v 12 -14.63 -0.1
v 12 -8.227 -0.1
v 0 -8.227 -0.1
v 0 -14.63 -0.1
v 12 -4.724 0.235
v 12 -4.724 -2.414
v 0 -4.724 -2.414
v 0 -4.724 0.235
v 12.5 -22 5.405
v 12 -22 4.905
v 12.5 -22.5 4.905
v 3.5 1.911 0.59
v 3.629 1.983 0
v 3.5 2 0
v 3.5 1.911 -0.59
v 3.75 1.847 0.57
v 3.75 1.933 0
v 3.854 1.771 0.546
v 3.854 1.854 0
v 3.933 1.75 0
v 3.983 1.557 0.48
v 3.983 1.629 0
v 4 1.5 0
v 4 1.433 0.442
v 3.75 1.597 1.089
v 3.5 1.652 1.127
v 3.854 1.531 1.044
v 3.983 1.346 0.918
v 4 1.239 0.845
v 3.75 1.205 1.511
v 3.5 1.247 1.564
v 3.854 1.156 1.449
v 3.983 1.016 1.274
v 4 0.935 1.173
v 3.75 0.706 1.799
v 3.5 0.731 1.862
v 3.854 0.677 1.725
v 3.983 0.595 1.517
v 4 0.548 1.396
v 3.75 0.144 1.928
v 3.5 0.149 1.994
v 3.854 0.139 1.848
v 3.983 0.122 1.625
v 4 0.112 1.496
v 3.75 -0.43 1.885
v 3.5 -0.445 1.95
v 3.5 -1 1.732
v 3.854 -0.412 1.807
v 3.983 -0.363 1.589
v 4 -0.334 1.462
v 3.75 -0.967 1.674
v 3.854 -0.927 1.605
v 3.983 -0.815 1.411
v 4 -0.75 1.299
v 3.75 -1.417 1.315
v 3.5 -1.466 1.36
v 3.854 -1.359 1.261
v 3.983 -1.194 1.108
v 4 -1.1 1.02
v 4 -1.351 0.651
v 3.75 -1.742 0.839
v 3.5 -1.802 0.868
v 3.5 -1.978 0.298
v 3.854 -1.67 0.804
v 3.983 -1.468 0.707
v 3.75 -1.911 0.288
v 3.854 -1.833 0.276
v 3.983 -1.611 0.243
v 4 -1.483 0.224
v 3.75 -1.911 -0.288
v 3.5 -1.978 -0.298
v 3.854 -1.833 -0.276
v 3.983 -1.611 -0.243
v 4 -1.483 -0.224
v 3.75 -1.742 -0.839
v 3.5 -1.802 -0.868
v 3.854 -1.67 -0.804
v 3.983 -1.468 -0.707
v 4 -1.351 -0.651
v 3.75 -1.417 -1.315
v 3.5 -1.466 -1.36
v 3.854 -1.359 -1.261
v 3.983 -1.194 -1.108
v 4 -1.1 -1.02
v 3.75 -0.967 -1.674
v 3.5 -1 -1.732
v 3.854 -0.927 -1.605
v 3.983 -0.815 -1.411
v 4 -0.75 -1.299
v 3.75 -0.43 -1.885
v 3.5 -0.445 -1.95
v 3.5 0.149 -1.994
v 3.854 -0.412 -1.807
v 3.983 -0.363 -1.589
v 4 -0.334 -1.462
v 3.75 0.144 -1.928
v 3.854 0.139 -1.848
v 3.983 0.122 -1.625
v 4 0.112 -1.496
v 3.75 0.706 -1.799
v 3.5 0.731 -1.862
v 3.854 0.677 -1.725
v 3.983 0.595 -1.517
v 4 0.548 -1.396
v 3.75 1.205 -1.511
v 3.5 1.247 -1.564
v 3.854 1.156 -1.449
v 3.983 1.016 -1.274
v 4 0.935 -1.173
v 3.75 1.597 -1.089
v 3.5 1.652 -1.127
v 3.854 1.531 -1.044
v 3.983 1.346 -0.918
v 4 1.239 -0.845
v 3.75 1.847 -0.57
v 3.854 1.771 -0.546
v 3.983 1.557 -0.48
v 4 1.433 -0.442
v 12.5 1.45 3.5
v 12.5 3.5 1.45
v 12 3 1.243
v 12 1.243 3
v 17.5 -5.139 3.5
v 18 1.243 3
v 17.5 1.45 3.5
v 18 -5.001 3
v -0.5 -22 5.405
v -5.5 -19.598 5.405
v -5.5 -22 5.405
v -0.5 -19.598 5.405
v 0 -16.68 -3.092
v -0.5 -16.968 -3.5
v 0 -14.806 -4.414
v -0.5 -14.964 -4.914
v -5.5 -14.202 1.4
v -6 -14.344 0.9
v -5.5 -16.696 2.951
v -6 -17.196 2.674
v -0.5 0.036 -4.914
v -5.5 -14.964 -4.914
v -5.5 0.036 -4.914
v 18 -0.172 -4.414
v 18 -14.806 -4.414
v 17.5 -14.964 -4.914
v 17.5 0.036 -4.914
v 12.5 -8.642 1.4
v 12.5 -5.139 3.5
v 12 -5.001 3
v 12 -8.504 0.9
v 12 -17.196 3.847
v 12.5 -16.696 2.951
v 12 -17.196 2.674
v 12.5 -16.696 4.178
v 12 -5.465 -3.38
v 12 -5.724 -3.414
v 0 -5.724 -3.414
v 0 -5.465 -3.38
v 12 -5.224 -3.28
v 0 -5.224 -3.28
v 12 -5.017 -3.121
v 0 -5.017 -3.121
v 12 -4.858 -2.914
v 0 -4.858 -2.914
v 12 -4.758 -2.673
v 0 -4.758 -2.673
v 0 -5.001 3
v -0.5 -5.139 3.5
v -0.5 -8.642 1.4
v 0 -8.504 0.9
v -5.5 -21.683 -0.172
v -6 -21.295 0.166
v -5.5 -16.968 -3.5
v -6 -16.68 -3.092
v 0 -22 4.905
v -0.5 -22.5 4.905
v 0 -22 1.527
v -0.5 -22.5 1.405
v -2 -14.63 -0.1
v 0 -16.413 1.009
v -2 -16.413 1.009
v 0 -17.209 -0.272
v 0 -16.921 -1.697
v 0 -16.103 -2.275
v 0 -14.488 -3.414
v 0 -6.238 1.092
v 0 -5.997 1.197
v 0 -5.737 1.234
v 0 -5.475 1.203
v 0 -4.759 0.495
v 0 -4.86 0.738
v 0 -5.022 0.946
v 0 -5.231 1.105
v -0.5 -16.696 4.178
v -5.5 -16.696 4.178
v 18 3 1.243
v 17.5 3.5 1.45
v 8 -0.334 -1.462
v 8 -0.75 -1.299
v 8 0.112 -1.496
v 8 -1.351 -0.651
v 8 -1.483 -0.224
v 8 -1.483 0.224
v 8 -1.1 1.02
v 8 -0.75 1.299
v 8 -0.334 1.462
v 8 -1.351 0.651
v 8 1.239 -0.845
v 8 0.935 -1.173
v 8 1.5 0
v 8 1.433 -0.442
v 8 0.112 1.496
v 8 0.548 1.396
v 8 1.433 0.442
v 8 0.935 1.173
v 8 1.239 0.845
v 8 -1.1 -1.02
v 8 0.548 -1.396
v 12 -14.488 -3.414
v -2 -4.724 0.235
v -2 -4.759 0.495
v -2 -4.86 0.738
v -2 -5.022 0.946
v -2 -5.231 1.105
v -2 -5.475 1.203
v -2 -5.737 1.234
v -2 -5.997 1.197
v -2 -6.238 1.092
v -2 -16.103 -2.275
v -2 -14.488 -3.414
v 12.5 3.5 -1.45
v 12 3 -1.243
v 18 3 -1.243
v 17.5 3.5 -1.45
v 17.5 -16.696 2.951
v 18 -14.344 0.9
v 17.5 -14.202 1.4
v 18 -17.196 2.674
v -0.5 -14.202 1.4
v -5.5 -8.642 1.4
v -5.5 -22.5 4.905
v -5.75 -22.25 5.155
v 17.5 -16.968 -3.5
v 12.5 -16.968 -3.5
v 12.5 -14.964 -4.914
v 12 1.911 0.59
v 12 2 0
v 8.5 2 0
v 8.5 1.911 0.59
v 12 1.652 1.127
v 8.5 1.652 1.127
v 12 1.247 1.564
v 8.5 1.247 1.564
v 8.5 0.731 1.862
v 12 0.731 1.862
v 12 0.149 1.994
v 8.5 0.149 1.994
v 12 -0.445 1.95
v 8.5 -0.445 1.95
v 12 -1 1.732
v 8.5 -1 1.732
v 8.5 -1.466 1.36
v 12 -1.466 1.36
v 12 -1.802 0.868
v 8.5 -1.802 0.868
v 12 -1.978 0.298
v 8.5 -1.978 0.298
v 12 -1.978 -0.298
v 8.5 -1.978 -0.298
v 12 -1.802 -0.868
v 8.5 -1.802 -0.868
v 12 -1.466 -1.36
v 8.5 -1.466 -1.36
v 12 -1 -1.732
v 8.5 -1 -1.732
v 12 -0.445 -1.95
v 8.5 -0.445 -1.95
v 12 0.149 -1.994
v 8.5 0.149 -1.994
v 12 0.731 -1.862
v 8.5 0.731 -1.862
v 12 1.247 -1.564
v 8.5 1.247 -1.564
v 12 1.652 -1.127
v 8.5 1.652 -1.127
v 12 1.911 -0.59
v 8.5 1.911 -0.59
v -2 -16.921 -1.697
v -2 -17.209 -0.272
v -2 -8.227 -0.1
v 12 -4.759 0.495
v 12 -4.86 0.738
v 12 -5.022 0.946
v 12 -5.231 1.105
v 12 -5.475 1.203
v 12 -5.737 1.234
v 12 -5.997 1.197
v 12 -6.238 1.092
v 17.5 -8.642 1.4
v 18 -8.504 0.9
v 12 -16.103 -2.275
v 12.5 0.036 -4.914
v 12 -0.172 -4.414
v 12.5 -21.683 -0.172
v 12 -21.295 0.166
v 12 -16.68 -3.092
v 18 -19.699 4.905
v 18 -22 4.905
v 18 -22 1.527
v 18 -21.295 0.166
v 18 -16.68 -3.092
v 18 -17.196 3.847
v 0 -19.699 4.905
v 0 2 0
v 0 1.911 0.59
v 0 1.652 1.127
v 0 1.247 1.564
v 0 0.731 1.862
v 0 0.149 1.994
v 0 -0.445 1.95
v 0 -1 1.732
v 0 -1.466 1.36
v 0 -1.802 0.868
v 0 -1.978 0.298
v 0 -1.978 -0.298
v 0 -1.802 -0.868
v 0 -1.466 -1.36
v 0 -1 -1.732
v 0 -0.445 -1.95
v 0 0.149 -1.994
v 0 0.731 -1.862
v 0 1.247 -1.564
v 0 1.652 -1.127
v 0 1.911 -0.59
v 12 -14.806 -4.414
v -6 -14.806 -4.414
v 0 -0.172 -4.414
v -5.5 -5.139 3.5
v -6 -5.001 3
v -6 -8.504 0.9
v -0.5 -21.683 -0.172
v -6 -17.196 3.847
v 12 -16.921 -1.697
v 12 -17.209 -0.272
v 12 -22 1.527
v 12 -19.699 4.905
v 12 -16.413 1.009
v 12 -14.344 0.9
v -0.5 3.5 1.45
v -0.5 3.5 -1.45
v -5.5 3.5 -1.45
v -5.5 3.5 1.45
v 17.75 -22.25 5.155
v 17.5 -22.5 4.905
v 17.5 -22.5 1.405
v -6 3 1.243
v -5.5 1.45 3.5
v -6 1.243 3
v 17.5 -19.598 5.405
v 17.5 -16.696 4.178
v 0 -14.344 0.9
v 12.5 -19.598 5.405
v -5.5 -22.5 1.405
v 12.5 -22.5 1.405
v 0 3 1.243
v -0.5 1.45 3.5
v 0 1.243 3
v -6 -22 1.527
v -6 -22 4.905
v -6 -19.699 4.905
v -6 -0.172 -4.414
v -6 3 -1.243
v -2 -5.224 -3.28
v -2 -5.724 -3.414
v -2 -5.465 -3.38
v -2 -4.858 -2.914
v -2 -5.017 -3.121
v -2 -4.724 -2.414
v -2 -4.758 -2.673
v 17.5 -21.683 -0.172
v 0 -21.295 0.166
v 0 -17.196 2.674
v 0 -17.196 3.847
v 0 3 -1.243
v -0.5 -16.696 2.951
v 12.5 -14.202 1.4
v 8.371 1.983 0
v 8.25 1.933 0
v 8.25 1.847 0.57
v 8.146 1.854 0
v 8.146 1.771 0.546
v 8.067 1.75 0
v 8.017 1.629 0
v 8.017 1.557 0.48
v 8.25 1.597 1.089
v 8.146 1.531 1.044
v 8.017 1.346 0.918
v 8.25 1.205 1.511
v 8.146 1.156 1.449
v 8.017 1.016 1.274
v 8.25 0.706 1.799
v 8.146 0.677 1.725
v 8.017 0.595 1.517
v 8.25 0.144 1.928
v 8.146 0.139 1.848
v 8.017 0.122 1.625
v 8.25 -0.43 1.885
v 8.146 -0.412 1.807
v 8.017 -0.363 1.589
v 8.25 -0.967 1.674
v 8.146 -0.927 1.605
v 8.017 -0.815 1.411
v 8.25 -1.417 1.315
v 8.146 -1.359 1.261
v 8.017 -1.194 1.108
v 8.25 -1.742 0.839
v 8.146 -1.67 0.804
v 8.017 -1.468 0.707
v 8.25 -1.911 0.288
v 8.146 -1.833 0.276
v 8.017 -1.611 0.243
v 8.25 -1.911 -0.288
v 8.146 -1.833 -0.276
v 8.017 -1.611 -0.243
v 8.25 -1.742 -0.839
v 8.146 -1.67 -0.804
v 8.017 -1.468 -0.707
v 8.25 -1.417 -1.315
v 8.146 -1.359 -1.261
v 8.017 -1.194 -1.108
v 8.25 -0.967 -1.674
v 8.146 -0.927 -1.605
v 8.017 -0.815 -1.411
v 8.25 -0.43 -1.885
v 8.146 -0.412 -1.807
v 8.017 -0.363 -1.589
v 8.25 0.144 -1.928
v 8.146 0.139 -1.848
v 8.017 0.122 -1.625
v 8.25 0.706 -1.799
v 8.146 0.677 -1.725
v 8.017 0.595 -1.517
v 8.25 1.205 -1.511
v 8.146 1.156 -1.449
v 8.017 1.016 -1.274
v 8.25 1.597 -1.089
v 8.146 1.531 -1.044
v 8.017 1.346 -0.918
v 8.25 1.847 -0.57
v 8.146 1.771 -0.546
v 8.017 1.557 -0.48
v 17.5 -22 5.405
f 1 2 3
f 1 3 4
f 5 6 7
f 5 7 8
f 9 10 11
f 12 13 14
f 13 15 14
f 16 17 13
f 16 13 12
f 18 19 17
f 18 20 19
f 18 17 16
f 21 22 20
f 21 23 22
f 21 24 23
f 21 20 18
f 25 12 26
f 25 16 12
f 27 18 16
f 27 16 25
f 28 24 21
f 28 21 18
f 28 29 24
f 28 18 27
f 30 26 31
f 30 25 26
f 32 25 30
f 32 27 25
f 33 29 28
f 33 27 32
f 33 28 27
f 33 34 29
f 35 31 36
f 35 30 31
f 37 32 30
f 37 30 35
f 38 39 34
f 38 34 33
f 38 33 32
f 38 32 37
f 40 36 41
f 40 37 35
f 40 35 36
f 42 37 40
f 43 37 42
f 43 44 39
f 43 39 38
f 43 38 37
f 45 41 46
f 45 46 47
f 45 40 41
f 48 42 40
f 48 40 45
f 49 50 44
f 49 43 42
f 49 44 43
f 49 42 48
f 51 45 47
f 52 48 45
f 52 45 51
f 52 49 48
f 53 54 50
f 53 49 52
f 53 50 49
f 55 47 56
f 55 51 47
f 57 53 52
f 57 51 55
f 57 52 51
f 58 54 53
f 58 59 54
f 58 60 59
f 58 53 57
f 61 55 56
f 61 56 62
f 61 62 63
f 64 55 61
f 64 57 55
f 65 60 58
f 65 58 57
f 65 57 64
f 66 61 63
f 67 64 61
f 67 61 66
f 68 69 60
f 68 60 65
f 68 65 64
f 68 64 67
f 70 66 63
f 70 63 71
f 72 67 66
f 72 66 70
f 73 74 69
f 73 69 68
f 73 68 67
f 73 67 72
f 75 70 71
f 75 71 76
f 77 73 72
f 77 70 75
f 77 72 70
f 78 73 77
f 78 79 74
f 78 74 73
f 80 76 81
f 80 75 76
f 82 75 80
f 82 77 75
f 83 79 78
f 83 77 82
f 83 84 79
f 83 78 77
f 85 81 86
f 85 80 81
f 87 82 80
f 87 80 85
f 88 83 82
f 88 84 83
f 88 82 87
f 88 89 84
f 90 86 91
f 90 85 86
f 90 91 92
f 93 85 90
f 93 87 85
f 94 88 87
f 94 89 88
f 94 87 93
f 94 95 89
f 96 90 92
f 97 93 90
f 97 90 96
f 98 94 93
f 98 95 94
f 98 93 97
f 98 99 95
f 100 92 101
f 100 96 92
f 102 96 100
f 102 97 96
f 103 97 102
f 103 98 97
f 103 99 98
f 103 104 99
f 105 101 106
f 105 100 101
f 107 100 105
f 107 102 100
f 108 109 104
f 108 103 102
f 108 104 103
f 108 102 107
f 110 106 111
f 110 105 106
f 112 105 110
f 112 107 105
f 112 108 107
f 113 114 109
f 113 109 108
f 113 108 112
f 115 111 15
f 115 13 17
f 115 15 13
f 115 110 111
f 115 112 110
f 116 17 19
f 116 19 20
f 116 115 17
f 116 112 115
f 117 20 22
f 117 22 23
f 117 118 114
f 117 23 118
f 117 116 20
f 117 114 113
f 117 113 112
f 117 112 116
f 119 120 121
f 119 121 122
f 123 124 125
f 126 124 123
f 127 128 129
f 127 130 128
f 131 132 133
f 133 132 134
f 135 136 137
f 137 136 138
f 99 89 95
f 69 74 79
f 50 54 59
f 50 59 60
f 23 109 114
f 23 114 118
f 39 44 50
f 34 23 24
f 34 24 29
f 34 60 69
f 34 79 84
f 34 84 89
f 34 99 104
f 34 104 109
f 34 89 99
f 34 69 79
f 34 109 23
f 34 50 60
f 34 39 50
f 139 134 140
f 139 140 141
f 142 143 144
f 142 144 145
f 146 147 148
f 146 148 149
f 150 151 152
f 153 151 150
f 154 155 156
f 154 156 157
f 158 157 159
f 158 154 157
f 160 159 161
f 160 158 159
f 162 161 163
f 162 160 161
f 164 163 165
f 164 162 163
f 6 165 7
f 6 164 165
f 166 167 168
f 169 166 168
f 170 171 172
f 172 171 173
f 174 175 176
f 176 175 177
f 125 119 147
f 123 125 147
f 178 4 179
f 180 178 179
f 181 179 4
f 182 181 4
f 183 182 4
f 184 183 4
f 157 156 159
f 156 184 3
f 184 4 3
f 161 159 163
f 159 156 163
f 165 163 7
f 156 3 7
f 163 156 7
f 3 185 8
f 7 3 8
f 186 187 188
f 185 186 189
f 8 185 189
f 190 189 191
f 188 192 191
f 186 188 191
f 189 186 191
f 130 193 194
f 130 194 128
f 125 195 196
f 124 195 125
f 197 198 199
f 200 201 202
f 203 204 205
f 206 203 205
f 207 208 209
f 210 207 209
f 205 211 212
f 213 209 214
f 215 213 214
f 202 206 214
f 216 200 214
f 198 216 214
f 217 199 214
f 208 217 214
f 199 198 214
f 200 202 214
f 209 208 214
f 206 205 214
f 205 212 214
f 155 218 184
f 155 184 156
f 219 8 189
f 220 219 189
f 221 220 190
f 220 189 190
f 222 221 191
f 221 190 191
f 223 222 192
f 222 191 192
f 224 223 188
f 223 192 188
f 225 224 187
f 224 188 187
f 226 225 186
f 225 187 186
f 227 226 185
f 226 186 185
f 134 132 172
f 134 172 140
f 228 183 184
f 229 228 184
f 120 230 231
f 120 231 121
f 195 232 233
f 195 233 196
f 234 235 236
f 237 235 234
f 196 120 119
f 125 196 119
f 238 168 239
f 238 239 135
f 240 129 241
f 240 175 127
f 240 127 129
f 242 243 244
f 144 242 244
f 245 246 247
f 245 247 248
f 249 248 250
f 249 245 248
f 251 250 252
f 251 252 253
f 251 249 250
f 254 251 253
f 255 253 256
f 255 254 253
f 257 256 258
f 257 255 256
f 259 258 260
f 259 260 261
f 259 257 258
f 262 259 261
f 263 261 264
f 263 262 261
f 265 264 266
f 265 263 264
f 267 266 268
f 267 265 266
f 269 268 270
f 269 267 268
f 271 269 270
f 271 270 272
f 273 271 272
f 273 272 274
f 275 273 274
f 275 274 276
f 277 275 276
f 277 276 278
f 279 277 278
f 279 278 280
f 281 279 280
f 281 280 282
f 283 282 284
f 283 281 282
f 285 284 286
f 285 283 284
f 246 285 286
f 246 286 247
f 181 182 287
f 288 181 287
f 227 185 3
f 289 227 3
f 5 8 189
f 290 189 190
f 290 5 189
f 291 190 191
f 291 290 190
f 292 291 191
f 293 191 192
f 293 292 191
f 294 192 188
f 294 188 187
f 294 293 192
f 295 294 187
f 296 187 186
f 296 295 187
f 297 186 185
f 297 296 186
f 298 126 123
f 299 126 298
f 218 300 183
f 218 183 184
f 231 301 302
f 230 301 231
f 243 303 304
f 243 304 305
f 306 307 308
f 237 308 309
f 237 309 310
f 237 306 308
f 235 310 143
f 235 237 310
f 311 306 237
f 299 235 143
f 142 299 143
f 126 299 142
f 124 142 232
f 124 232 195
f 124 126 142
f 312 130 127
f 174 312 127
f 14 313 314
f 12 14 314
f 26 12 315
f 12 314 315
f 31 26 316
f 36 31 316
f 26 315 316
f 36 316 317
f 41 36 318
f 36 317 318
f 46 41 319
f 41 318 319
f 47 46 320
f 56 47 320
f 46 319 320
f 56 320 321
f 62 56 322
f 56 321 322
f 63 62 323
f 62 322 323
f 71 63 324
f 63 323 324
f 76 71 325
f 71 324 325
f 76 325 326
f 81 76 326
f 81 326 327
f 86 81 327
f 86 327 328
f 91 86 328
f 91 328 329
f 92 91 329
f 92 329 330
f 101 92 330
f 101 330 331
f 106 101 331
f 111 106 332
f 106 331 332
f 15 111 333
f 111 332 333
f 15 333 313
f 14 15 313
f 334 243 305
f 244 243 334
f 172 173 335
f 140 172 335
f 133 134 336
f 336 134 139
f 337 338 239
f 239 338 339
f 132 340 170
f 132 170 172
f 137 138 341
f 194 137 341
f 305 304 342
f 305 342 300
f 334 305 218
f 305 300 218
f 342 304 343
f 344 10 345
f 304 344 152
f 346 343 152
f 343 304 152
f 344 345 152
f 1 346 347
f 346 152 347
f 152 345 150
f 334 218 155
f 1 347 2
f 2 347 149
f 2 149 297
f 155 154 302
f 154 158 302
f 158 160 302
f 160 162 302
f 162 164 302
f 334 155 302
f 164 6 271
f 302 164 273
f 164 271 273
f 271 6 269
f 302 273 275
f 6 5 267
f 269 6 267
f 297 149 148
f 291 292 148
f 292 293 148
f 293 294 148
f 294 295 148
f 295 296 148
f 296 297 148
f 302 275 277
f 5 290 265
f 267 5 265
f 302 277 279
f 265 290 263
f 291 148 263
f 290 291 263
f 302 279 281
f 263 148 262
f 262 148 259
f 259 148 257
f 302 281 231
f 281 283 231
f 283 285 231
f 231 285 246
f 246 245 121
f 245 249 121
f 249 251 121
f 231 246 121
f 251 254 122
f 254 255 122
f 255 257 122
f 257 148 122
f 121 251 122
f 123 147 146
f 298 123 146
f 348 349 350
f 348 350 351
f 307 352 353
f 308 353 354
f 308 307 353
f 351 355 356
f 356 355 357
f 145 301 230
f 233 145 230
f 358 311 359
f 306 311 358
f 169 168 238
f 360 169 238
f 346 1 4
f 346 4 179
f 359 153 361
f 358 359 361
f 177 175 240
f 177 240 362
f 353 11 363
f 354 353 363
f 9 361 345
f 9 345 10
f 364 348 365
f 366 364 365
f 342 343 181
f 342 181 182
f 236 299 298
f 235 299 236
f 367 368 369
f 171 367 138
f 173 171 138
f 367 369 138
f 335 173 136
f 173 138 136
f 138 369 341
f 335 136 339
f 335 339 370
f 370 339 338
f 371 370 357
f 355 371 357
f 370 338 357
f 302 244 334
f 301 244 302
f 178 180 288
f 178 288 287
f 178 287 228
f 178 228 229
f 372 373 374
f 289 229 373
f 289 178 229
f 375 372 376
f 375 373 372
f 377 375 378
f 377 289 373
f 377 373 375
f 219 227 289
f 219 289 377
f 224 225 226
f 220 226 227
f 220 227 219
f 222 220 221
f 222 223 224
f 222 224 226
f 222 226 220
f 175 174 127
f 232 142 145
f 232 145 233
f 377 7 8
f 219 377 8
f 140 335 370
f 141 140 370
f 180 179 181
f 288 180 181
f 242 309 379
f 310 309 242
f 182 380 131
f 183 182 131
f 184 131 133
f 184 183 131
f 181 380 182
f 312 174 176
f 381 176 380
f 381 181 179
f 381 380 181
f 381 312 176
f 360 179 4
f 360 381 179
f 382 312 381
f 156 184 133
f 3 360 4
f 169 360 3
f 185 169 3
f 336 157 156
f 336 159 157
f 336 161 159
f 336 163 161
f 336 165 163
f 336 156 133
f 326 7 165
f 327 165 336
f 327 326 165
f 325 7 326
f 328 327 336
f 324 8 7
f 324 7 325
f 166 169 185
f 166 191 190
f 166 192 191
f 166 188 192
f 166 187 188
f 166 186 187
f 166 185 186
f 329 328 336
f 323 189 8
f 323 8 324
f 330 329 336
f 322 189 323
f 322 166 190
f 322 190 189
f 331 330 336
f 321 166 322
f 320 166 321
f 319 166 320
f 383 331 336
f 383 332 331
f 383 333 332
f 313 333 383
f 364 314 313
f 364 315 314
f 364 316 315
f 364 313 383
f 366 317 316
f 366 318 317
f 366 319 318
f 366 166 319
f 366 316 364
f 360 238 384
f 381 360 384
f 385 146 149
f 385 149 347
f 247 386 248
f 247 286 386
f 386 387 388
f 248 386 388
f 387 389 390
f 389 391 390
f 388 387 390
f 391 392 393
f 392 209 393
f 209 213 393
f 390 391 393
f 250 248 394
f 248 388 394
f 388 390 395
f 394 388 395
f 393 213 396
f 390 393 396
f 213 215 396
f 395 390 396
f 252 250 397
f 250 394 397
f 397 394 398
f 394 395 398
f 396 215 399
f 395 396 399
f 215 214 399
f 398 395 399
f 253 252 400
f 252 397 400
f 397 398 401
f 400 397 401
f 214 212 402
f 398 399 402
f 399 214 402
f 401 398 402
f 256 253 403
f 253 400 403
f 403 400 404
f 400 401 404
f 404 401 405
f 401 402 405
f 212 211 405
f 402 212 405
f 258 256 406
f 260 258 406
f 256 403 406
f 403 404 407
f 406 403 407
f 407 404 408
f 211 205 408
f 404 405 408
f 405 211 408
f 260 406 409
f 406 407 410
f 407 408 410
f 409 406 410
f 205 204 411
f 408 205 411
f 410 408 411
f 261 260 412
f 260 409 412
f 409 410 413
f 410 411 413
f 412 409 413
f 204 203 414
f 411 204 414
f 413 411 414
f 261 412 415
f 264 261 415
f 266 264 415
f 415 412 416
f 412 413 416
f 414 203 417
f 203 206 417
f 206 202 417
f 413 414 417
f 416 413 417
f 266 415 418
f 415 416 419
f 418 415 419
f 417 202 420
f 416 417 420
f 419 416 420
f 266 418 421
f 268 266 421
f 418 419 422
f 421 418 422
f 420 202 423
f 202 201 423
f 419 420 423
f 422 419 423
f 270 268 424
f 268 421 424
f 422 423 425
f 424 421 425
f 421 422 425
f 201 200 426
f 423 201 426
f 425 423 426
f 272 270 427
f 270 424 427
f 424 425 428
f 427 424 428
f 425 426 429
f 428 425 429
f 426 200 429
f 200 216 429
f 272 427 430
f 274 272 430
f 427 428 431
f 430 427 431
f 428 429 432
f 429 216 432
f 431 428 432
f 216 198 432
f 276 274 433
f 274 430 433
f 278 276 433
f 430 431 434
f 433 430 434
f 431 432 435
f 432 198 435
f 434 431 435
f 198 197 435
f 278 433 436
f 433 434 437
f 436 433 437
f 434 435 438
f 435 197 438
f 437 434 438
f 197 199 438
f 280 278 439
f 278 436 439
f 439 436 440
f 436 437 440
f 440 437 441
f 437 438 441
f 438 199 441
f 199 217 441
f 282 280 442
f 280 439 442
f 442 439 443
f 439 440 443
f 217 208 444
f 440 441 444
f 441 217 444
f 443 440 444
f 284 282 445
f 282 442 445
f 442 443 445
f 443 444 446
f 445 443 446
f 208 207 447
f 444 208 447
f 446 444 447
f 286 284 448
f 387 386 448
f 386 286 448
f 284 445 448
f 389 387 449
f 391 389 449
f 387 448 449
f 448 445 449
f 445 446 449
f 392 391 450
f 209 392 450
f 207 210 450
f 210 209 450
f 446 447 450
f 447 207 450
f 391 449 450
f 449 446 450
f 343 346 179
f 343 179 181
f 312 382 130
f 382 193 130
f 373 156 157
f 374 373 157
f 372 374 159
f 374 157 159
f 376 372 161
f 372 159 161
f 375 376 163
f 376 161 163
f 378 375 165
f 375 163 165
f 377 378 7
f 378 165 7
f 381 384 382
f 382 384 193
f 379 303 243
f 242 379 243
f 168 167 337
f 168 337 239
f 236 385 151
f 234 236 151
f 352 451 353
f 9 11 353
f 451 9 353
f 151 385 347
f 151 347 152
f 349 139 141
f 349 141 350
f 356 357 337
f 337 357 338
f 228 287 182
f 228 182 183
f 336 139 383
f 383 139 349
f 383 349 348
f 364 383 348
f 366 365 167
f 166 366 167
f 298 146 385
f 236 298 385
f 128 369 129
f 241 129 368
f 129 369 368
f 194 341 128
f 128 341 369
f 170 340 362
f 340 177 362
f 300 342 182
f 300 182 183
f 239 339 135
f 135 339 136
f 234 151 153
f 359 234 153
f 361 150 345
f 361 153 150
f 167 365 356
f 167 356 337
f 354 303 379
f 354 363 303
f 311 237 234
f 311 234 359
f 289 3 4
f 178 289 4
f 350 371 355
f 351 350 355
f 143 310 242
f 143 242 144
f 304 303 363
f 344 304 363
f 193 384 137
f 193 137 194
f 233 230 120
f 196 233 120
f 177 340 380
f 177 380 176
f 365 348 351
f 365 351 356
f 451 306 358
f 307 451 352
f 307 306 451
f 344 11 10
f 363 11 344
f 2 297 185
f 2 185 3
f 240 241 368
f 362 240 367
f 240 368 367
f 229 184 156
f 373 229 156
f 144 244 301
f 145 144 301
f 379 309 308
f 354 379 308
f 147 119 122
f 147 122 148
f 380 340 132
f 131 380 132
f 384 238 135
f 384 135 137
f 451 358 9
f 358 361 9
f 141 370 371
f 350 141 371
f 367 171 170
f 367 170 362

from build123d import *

# Parameters (mm, degrees)
F0_R      = 2
F1_DEPTH  = 6
F2_DEPTH  = 4
F3_DEPTH  = 2
F4_SIZE   = 1
F5_SIZE   = 1
F6_SIZE   = 0.5
F7_SIZE   = 0.5
F8_R      = 0.5
F11_DEPTH = 14


with BuildPart() as f1:
    # F0 (on Right) → F1 (new body)
    with BuildSketch(Plane.YZ):
        Polygon((1.4497474683, 3.5), (-1.4497474683, 3.5), (-5.139452645, 3.5), (-8.6422068998, 1.400000032), (-11.1441742629, 1.400000032), (-14.201618099, 1.400000032), (-16.696166385, 2.9513884384), (-16.696166385, 4.178149983), (-19.5980831925, 5.4049115275), (-22.5, 5.4049115275), (-22.5, 0.4049115275), (-16.9679636748, -3.5), (-14.9644660941, -4.9142135624), (0.0355339059, -4.9142135624), (1.4497474683, -3.5), (3.5, -1.4497474683), (3.5, 1.4497474683), align=None)
        with BuildLine():
            Line((-16.1029470532, -2.2745424348), (-17.7375390443, -1.120729131))
            Line((-17.7375390443, -1.120729131), (-16.4130871063, 1.008917641))
            Line((-16.4130871063, 1.008917641), (-14.6300078277, -0.099999968))
            Line((-14.6300078277, -0.099999968), (-11.1441742629, -0.099999968))
            Line((-11.1441742629, -0.099999968), (-8.2270111399, -0.099999968))
            Line((-8.2270111399, -0.099999968), (-6.2384550759, 1.092195478))
            ThreePointArc((-6.2384550759, 1.092195478), (-5.2314071062, 1.1046384988), (-4.7242568851, 0.2345240837))
            Line((-4.7242568851, 0.2345240837), (-4.7242568851, -2.4142135624))
            ThreePointArc((-4.7242568851, -2.4142135624), (-5.0171501039, -3.1213203436), (-5.7242568851, -3.4142135624))
            Line((-5.7242568851, -3.4142135624), (-14.4883900953, -3.4142135624))
            Line((-14.4883900953, -3.4142135624), (-16.1029470532, -2.2745424348))
        make_face(mode=Mode.SUBTRACT)
        Circle(F0_R, mode=Mode.SUBTRACT)
        with BuildLine():
            Line((-16.4130871063, 1.008917641), (-17.7375390443, -1.120729131))
            Line((-17.7375390443, -1.120729131), (-16.1029470532, -2.2745424348))
            Line((-16.1029470532, -2.2745424348), (-14.4883900953, -3.4142135624))
            Line((-14.4883900953, -3.4142135624), (-5.7242568851, -3.4142135624))
            ThreePointArc((-5.7242568851, -3.4142135624), (-5.0171501039, -3.1213203436), (-4.7242568851, -2.4142135624))
            Line((-4.7242568851, -2.4142135624), (-4.7242568851, 0.2345240837))
            ThreePointArc((-4.7242568851, 0.2345240837), (-5.2314071062, 1.1046384988), (-6.2384550759, 1.092195478))
            Line((-6.2384550759, 1.092195478), (-8.2270111399, -0.099999968))
            Line((-8.2270111399, -0.099999968), (-11.1441742629, -0.099999968))
            Line((-11.1441742629, -0.099999968), (-14.6300078277, -0.099999968))
            Line((-14.6300078277, -0.099999968), (-16.4130871063, 1.008917641))
        make_face()
        Circle(F0_R)
    extrude(amount=-F1_DEPTH)

    # F0 (on Right) → F2 (join)
    with BuildSketch(Plane.YZ):
        Circle(F0_R)
    extrude(amount=F2_DEPTH)

    # F0 (on Right) → F3 (cut)
    with BuildSketch(Plane.YZ):
        with BuildLine():
            Line((-16.4130871063, 1.008917641), (-17.7375390443, -1.120729131))
            Line((-17.7375390443, -1.120729131), (-16.1029470532, -2.2745424348))
            Line((-16.1029470532, -2.2745424348), (-14.4883900953, -3.4142135624))
            Line((-14.4883900953, -3.4142135624), (-5.7242568851, -3.4142135624))
            ThreePointArc((-5.7242568851, -3.4142135624), (-5.0171501039, -3.1213203436), (-4.7242568851, -2.4142135624))
            Line((-4.7242568851, -2.4142135624), (-4.7242568851, 0.2345240837))
            ThreePointArc((-4.7242568851, 0.2345240837), (-5.2314071062, 1.1046384988), (-6.2384550759, 1.092195478))
            Line((-6.2384550759, 1.092195478), (-8.2270111399, -0.099999968))
            Line((-8.2270111399, -0.099999968), (-11.1441742629, -0.099999968))
            Line((-11.1441742629, -0.099999968), (-14.6300078277, -0.099999968))
            Line((-14.6300078277, -0.099999968), (-16.4130871063, 1.008917641))
        make_face()
    extrude(amount=-F3_DEPTH, mode=Mode.SUBTRACT)

    # F4
    f4_edges = [f1.edges().sort_by_distance(p)[0] for p in [
        (-1, -17.737539, -1.120729),
    ]]
    chamfer(f4_edges, length=F4_SIZE)

    # F5
    f5_edges = [f1.edges().sort_by_distance(p)[0] for p in [
        (-3, -22.5, 0.404912),
    ]]
    chamfer(f5_edges, length=F5_SIZE)

    # F6
    f6_edges = [f1.edges().sort_by_distance(p)[0] for p in [
        (-6, -21.049042, 5.404912),
        (-6, -15.448892, 2.175694),
        (-6, -11.421912, 1.4),
        (-6, -6.89083, 2.45),
        (-6, -1.844853, 3.5),
        (-6, -22.091514, 0.616573),
        (-6, -18.323747, -2.54299),
        (-6, -22.5, 3.404912),
        (-6, 2.474874, 2.474874),
        (-6, 3.5, 0),
        (-6, 1.767767, -3.181981),
        (-6, -16.696166, 3.564769),
        (-6, -7.464466, -4.914214),
        (-6, -18.147125, 4.791531),
        (0, -18.147125, 4.791531),
    ]]
    chamfer(f6_edges, length=F6_SIZE)

    # F7
    f7_edges = [f1.edges().sort_by_distance(p)[0] for p in [
        (0, -11.421912, 1.4),
        (0, -6.89083, 2.45),
        (0, -15.448892, 2.175694),
        (0, -16.696166, 3.293348),
        (0, -21.691091, 5.404912),
        (0, -22.5, 3.404912),
        (0, -22.091514, 0.616573),
        (0, -18.323747, -2.54299),
        (0, -7.464466, -4.914214),
        (0, 1.767767, -3.181981),
        (0, 3.5, 0),
        (0, 2.474874, 2.474874),
        (0, -1.844853, 3.5),
        (-2.75, -22.5, 5.404912),
    ]]
    chamfer(f7_edges, length=F7_SIZE)

    # F8
    f8_edges = [f1.edges().sort_by_distance(p)[0] for p in [
        (4, -2, 0),
    ]]
    fillet(f8_edges, radius=F8_R)


with BuildPart() as f10_1:
    # F10: instance of F1
    add(f1.part.mirror(Plane.YZ.offset(6)))


with BuildPart() as f1_1:
    add(f1.part)

    # F11 (add): a face of the model
    f11_faces = [f10_1.part.faces().sort_by_distance(p)[0] for p in [
        (14, -10.4675316071, -1.4739709128),
    ]]

    add(f10_1.part)  # F11 merges F10_1
    extrude(f11_faces, amount=F11_DEPTH)


solid = f1_1.part
